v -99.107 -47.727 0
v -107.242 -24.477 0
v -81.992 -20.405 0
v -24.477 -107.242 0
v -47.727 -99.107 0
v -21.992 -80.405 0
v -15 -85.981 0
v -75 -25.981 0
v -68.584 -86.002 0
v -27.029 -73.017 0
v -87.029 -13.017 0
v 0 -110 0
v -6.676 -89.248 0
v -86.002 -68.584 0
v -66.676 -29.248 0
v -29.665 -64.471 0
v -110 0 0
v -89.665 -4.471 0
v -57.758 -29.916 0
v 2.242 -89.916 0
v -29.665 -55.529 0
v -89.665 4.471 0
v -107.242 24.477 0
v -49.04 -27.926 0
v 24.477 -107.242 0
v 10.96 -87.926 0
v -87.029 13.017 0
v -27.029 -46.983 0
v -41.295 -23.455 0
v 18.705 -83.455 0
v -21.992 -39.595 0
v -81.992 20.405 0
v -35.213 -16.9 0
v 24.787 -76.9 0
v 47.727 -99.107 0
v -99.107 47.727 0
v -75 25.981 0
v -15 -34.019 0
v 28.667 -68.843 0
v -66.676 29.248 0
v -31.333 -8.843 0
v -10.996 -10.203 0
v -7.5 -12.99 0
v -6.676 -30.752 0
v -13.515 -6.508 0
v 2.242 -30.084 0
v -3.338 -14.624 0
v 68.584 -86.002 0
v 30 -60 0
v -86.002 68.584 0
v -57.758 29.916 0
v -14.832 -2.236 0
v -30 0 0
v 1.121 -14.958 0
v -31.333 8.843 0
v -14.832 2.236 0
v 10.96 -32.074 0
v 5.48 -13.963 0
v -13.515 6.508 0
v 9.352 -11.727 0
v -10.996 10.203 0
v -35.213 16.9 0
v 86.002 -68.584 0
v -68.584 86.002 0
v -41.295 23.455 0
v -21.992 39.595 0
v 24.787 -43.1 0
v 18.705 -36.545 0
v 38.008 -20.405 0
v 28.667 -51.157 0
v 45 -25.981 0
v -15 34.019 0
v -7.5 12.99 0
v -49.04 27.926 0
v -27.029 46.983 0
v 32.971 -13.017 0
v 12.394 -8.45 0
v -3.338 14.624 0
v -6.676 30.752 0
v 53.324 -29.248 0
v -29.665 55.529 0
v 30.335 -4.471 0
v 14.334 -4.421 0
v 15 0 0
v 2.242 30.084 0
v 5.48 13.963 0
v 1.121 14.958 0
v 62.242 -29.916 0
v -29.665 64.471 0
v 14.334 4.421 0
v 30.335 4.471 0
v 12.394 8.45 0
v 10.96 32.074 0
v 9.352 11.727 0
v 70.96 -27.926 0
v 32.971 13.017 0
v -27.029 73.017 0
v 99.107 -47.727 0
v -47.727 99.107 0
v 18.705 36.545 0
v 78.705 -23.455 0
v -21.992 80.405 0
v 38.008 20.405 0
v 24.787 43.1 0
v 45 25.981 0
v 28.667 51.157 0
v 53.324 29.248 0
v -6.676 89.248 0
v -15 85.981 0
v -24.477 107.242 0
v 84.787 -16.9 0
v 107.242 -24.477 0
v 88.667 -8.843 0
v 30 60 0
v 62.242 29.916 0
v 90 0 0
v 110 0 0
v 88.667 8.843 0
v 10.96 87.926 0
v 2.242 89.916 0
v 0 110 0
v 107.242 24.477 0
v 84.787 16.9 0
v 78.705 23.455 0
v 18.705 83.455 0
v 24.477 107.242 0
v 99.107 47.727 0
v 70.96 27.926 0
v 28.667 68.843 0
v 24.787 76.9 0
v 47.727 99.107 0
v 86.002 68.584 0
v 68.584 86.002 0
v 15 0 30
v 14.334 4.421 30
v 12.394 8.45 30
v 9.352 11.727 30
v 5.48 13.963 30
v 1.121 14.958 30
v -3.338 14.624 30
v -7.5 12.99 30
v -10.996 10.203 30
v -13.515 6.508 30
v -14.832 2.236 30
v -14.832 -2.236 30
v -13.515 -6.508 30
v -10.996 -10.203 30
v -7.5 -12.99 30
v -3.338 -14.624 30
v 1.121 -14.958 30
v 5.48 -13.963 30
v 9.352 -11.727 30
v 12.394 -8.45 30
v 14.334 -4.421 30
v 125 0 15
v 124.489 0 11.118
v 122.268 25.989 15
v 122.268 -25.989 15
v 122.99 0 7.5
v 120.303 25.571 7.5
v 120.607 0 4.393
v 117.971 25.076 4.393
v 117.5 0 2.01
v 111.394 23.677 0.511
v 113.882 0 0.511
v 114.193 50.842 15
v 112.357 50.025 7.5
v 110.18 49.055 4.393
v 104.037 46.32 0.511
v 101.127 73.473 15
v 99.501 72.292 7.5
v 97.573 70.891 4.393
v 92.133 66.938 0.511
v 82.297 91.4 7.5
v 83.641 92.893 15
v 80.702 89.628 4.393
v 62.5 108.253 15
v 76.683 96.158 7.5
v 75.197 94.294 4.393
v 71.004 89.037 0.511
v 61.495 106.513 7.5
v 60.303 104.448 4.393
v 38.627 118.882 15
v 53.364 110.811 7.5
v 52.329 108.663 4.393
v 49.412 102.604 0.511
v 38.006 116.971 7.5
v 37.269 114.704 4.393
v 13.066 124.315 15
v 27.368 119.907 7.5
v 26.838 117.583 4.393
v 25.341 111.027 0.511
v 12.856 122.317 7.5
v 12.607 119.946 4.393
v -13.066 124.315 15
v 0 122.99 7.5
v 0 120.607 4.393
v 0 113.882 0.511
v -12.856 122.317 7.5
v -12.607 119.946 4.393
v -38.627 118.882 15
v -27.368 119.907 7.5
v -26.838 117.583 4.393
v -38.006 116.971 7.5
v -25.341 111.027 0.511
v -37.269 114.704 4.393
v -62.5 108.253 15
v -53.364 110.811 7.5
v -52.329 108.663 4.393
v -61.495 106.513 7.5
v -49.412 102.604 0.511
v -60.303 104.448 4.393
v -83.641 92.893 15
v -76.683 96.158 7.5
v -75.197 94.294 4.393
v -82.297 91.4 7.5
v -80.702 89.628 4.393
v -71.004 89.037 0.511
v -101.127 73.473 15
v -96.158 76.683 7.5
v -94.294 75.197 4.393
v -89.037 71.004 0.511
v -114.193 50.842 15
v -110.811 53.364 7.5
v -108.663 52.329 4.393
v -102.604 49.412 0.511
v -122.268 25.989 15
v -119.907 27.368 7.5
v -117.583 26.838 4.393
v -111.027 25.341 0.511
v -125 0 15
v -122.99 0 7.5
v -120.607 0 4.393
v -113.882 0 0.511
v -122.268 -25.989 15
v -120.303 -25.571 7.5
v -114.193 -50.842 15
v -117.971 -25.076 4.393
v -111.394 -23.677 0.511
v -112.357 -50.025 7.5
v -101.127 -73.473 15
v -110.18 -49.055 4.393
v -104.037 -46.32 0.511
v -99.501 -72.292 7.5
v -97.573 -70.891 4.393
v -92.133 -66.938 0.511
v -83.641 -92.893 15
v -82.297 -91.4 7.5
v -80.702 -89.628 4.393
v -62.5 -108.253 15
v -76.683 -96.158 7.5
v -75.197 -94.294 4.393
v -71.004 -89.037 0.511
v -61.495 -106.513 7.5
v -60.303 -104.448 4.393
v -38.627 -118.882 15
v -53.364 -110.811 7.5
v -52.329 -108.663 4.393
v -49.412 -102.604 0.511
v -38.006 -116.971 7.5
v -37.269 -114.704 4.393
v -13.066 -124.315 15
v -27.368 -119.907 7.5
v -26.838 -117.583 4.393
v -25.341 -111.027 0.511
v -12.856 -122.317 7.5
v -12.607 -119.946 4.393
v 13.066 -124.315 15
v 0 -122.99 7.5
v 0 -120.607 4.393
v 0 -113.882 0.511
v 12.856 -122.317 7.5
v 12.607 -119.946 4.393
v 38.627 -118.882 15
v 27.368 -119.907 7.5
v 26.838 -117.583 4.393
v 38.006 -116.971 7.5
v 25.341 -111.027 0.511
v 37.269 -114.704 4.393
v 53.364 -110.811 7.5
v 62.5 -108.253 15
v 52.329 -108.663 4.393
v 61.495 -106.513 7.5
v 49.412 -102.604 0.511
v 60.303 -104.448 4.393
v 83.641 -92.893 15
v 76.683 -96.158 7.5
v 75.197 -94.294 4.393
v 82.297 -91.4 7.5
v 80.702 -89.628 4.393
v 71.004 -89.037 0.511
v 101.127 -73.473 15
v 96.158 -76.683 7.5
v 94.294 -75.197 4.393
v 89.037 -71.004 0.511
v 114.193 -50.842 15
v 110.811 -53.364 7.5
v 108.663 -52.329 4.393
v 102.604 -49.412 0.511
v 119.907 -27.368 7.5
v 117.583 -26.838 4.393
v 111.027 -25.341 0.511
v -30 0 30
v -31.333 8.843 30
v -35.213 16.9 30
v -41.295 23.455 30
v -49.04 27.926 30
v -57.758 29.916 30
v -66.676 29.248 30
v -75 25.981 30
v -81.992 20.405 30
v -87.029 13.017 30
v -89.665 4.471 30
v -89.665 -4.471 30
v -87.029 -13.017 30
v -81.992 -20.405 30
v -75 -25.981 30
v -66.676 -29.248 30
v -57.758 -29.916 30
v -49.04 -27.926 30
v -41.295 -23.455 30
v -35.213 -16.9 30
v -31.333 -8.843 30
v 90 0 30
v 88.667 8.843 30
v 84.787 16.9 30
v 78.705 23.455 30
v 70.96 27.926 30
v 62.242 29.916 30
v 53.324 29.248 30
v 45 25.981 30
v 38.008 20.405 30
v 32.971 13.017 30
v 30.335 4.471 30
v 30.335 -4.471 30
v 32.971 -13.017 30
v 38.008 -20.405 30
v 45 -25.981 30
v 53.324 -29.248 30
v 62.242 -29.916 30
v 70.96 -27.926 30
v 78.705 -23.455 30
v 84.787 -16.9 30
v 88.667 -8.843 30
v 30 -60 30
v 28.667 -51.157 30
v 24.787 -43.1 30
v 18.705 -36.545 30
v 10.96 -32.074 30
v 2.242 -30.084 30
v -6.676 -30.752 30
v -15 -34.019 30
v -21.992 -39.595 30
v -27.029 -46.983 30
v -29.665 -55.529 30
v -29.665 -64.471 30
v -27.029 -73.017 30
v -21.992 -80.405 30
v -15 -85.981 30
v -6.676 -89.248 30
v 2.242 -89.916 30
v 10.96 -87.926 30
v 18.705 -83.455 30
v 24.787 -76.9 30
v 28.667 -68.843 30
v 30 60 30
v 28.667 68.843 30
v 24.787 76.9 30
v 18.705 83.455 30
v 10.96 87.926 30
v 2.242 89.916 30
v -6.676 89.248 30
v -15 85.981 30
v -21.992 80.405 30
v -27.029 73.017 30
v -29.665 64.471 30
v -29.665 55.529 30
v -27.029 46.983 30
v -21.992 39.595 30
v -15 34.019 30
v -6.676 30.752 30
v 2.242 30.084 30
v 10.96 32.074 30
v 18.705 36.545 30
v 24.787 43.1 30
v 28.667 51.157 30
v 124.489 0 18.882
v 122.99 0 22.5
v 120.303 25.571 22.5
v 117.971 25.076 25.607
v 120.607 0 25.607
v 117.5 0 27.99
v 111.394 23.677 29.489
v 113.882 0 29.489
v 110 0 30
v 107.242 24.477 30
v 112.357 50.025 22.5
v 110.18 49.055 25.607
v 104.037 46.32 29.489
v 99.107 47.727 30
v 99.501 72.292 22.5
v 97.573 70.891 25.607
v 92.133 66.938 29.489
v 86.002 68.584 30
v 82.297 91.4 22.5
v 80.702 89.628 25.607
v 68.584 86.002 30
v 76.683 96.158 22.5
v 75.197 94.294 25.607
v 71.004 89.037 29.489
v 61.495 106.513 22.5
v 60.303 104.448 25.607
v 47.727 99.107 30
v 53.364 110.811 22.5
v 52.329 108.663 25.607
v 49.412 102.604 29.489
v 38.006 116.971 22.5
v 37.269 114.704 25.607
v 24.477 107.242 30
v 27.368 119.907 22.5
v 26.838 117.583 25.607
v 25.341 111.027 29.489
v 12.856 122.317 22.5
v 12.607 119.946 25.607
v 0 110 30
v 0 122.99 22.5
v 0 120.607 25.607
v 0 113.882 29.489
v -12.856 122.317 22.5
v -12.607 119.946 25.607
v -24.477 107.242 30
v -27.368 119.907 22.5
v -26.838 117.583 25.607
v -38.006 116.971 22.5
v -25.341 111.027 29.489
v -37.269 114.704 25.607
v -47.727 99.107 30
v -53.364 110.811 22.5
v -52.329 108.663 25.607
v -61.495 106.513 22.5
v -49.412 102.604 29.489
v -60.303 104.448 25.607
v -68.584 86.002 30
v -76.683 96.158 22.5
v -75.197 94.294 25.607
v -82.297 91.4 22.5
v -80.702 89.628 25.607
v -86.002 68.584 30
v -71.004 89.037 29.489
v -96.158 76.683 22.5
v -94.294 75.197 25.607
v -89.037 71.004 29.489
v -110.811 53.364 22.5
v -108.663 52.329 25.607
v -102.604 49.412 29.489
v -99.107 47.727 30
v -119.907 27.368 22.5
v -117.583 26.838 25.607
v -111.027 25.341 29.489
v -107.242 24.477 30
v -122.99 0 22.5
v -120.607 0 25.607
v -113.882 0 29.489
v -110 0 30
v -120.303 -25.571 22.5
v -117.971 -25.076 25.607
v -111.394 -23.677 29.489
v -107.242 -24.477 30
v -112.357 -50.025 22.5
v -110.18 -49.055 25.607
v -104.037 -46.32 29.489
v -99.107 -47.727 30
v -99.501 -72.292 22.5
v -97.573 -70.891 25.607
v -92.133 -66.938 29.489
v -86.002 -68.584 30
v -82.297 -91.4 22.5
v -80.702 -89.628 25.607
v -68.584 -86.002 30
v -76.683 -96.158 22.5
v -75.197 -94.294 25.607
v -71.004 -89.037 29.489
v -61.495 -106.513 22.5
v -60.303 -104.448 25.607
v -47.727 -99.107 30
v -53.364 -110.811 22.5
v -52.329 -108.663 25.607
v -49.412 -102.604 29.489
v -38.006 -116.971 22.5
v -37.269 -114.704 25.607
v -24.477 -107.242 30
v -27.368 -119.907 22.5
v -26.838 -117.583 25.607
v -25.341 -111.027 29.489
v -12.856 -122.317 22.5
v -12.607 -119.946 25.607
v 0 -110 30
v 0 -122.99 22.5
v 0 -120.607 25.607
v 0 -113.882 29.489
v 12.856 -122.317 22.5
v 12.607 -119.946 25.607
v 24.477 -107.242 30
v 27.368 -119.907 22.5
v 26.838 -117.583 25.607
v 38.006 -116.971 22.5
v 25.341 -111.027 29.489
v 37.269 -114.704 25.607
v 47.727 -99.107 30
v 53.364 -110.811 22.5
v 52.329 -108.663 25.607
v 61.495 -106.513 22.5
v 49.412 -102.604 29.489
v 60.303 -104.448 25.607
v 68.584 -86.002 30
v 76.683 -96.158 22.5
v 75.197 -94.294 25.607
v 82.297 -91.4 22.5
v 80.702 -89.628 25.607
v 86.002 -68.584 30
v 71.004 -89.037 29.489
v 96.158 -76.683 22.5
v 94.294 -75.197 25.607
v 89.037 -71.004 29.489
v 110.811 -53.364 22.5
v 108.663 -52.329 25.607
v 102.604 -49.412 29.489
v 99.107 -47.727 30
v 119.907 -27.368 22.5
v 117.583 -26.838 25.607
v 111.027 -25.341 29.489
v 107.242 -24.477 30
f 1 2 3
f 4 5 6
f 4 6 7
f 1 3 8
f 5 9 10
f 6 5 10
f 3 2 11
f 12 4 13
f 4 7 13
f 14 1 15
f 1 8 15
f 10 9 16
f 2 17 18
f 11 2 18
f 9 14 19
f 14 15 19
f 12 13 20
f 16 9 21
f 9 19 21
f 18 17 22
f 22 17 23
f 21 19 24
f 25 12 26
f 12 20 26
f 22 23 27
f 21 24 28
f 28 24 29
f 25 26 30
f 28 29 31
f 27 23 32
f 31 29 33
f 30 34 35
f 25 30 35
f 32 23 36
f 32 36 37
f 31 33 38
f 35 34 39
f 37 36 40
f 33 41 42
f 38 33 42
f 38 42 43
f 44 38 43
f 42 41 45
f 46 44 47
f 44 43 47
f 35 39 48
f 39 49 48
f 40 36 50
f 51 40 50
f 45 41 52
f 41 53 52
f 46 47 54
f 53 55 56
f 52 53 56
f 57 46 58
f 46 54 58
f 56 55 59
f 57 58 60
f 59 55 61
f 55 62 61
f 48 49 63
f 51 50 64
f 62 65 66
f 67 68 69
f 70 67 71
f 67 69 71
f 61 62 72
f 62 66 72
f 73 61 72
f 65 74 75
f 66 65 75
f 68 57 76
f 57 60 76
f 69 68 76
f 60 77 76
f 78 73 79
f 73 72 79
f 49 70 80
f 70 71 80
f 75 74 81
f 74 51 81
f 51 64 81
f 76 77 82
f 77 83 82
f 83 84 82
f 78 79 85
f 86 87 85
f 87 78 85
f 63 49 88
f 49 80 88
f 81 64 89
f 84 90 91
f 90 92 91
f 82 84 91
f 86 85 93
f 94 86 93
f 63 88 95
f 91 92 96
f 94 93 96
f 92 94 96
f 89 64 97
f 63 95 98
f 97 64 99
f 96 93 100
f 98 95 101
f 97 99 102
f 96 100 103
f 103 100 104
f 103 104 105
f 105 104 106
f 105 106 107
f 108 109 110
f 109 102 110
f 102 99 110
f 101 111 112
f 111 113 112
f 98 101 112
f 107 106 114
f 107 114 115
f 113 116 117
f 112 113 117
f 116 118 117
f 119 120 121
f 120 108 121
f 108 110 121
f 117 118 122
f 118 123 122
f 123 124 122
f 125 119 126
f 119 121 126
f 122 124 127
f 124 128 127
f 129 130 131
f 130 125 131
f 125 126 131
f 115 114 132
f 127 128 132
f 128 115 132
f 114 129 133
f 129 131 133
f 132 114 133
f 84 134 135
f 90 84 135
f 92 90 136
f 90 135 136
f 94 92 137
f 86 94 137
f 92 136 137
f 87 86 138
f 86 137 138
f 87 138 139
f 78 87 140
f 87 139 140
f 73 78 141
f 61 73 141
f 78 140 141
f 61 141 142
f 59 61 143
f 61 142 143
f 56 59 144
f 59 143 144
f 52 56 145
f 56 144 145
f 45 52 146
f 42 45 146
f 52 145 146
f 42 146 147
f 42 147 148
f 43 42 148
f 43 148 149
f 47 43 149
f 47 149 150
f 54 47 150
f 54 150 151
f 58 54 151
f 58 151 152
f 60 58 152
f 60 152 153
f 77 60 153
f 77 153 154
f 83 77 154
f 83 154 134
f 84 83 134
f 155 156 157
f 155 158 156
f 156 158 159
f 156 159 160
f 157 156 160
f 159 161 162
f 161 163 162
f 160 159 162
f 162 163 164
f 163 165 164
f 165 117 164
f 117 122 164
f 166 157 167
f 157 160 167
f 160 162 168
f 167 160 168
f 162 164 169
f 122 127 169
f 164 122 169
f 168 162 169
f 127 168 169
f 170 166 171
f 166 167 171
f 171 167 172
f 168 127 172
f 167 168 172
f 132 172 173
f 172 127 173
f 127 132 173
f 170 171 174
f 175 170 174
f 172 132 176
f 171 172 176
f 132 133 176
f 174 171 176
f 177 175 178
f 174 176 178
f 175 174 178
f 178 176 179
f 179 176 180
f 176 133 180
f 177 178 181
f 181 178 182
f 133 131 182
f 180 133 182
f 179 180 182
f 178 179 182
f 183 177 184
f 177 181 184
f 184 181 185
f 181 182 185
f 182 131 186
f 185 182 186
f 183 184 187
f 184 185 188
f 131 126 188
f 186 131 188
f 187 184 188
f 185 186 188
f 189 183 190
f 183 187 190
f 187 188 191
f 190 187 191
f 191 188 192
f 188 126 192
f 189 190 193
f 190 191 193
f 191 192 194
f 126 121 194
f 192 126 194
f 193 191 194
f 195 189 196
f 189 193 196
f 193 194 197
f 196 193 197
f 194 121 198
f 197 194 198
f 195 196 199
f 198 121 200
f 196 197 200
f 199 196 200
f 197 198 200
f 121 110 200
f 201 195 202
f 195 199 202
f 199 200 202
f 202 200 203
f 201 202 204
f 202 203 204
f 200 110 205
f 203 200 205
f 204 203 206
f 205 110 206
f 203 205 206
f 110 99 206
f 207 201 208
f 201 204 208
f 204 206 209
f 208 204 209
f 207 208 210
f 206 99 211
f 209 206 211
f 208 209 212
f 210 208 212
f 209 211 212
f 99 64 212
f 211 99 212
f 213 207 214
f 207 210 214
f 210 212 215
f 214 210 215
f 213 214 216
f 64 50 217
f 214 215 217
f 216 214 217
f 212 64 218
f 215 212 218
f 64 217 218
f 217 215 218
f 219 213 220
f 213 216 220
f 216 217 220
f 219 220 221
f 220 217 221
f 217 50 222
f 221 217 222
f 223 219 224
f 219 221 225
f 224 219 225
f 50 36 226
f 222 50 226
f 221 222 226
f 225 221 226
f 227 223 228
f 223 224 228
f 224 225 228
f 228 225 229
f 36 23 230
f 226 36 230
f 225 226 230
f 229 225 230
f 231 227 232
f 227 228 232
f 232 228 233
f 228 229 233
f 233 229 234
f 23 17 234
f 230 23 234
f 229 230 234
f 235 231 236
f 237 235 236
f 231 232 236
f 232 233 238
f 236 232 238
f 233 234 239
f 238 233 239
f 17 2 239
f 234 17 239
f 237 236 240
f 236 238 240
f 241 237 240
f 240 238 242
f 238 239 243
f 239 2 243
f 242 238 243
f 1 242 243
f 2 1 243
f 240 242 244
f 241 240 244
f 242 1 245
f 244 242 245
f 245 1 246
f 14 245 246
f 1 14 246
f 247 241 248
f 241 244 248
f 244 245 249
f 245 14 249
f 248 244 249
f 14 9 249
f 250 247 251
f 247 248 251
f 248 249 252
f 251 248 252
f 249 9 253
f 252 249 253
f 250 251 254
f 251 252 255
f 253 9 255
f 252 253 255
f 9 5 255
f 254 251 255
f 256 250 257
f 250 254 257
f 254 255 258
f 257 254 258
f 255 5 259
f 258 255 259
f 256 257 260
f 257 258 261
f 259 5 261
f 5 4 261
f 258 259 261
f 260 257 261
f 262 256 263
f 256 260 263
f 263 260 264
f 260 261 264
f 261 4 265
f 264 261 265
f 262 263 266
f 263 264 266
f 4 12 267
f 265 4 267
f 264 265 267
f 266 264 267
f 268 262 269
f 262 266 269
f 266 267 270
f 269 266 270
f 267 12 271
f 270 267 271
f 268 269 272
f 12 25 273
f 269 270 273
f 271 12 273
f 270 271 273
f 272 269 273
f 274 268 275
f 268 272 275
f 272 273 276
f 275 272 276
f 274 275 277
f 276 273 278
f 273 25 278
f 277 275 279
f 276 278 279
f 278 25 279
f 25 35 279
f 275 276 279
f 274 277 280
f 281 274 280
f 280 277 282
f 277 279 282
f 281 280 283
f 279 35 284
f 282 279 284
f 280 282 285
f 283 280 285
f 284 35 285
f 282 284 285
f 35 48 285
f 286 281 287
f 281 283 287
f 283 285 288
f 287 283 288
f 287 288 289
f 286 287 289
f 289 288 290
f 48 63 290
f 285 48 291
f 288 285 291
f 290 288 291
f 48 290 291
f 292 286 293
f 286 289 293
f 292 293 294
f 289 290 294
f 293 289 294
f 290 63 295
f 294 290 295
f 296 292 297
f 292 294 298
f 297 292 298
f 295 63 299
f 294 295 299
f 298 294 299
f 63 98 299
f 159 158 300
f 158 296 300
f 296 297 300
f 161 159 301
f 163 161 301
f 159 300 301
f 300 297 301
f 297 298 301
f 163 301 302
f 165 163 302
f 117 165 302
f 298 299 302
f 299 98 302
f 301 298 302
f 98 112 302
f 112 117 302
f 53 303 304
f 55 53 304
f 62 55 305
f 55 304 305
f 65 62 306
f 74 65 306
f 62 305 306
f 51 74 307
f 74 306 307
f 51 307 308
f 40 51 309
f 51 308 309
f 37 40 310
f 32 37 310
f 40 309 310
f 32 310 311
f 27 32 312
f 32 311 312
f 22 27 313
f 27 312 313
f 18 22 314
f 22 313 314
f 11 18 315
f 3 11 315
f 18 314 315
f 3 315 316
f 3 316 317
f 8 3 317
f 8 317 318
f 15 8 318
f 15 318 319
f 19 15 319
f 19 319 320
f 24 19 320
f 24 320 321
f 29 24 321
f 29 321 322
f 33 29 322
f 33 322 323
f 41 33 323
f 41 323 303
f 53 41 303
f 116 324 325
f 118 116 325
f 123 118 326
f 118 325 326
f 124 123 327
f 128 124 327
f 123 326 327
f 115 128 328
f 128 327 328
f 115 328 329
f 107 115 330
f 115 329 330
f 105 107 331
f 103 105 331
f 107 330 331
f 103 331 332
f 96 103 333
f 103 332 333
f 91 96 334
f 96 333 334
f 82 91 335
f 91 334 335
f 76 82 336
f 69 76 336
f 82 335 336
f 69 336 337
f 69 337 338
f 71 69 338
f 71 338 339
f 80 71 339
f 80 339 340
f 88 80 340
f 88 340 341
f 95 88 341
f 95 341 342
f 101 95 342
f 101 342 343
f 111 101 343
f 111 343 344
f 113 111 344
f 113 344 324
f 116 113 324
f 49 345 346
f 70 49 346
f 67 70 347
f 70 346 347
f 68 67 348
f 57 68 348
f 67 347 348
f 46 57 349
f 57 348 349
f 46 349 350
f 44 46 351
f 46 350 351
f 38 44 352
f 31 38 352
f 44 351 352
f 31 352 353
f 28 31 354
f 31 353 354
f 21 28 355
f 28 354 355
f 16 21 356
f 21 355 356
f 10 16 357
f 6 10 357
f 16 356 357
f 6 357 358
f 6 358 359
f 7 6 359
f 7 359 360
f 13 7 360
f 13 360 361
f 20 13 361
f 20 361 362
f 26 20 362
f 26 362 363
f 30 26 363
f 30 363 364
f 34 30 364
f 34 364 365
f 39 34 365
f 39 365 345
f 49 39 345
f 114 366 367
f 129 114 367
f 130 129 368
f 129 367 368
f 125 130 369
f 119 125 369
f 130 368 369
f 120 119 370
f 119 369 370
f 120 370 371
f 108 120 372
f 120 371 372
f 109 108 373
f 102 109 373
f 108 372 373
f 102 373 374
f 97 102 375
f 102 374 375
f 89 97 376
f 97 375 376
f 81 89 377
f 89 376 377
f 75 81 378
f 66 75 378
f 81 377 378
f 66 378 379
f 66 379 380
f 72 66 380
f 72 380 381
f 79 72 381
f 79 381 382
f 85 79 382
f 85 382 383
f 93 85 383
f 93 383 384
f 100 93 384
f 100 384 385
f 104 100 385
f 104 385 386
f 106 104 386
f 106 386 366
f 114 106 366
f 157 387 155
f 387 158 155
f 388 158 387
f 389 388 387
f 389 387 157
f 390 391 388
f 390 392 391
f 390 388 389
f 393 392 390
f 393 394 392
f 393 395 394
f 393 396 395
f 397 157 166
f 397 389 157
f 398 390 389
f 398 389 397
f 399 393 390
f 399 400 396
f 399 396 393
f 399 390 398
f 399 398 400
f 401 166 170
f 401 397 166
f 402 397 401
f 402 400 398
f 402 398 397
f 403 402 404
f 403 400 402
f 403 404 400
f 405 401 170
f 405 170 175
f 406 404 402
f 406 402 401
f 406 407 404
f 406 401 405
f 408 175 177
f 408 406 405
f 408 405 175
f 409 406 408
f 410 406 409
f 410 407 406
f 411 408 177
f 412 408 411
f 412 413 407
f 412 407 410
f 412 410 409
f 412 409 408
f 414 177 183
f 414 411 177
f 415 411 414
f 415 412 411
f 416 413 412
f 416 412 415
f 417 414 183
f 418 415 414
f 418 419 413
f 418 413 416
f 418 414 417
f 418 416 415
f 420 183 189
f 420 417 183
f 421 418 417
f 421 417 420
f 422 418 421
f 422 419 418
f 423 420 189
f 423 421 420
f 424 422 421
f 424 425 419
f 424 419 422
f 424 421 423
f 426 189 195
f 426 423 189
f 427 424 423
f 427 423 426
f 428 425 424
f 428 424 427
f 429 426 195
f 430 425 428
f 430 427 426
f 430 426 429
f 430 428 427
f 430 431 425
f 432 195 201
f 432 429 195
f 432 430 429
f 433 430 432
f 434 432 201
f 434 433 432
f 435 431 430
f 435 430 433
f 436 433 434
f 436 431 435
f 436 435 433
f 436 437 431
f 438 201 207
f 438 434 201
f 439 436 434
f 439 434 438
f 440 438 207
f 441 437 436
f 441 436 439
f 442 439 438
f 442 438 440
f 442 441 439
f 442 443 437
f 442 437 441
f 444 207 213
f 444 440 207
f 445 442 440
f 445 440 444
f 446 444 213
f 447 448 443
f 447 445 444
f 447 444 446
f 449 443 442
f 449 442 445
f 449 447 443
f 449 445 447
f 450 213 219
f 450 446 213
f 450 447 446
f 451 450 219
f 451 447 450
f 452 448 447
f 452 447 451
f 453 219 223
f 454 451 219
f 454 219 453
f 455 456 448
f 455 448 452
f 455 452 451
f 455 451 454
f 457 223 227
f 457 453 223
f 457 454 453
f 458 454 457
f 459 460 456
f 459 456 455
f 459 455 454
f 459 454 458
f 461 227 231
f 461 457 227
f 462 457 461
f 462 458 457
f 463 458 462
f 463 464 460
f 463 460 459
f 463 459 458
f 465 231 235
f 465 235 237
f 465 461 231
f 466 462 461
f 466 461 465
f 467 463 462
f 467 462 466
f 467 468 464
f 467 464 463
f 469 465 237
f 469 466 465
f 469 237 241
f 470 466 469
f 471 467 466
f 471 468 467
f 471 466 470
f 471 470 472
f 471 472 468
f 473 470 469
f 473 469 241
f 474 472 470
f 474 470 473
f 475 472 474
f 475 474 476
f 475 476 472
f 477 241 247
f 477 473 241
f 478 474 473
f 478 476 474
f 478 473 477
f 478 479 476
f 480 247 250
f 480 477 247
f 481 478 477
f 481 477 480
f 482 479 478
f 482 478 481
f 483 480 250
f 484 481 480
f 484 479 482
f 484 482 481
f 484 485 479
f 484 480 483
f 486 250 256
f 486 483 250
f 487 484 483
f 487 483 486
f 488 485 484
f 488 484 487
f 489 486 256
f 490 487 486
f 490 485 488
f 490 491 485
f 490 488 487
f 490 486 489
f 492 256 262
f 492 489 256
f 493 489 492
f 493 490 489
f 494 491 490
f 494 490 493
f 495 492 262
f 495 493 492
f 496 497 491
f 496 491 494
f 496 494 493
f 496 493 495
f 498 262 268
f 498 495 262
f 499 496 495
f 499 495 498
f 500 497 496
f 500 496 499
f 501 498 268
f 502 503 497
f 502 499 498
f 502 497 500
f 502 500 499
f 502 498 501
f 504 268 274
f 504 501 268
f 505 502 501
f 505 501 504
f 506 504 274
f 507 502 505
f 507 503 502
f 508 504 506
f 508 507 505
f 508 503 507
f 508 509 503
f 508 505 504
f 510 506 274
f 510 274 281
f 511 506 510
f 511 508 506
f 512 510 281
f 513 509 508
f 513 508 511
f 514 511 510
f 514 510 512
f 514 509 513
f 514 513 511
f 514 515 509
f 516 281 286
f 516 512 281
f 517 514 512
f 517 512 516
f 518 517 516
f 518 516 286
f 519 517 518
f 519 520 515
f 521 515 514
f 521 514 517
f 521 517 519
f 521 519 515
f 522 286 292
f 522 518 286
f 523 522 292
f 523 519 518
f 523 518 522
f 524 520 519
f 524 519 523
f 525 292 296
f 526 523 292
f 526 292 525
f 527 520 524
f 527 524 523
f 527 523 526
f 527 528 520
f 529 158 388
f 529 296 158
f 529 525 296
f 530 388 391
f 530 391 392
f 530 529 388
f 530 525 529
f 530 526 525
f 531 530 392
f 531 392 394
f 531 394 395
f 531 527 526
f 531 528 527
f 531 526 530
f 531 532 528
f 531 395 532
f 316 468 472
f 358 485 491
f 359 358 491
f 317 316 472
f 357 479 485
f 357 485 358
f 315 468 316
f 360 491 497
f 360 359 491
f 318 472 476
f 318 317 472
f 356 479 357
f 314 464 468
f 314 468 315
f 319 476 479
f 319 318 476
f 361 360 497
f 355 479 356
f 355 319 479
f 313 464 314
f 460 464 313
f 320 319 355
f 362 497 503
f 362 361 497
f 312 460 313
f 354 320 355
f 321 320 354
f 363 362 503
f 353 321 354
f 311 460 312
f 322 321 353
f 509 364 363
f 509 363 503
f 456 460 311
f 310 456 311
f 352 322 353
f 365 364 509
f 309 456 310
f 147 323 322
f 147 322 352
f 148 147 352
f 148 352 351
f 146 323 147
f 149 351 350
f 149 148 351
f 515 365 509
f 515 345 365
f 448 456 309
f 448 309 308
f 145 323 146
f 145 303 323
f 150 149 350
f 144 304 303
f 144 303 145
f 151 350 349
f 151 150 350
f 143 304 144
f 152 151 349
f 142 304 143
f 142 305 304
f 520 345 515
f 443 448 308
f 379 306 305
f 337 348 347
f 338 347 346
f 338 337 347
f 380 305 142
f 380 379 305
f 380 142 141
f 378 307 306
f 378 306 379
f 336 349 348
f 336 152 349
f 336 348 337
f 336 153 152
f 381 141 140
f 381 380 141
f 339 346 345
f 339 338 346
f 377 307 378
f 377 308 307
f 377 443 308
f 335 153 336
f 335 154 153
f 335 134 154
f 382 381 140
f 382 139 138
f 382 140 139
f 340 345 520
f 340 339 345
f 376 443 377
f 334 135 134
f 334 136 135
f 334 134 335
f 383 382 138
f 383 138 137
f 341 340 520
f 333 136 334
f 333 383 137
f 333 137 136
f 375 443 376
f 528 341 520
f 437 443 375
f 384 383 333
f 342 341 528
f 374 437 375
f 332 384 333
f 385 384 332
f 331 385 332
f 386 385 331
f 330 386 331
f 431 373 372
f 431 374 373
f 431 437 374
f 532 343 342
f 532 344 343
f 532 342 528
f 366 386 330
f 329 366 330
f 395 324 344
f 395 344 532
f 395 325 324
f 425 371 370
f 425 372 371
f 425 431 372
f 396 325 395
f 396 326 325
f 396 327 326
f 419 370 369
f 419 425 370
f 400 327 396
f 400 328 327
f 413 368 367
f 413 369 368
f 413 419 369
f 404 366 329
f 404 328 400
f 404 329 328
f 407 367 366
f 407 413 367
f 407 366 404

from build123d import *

# Parameters (mm, degrees)
SKETCH2_R           = 125
BOSS_EXTRUDE1_DEPTH = 30
FILLET1_R           = 15
SKETCH3_R           = 15
CUT_EXTRUDE1_DEPTH  = 180.30421077
SKETCH6_R           = 30
CUT_EXTRUDE2_DEPTH  = 180.30421077


with BuildPart() as part:
    # Sketch2 → Boss-Extrude1 (new body)
    with BuildSketch(Plane.XY):
        Circle(SKETCH2_R)
    extrude(amount=BOSS_EXTRUDE1_DEPTH)

    # Fillet1
    fillet1_edges = [part.edges().sort_by_distance(p)[0] for p in [
        (-125, 0, 0),
        (-125, 0, 30),
    ]]
    fillet(fillet1_edges, radius=FILLET1_R - 0.0001)  # a hair under: the kernel refuses the full size

    # Sketch3 → Cut-Extrude1 (cut, through all)
    with BuildSketch(Plane.XY.offset(30)):
        Circle(SKETCH3_R)
    extrude(amount=-CUT_EXTRUDE1_DEPTH, mode=Mode.SUBTRACT)

    # Sketch6 → Cut-Extrude2 (cut, through all)
    with BuildSketch(Plane.XY.offset(30)):
        with Locations((0, 60)):
            Circle(SKETCH6_R)
        with Locations((60, 0)):
            Circle(SKETCH6_R)
        with Locations((0, -60)):
            Circle(SKETCH6_R)
        with Locations((-60, 0)):
            Circle(SKETCH6_R)
    extrude(amount=-CUT_EXTRUDE2_DEPTH, mode=Mode.SUBTRACT)


solid = part.part
